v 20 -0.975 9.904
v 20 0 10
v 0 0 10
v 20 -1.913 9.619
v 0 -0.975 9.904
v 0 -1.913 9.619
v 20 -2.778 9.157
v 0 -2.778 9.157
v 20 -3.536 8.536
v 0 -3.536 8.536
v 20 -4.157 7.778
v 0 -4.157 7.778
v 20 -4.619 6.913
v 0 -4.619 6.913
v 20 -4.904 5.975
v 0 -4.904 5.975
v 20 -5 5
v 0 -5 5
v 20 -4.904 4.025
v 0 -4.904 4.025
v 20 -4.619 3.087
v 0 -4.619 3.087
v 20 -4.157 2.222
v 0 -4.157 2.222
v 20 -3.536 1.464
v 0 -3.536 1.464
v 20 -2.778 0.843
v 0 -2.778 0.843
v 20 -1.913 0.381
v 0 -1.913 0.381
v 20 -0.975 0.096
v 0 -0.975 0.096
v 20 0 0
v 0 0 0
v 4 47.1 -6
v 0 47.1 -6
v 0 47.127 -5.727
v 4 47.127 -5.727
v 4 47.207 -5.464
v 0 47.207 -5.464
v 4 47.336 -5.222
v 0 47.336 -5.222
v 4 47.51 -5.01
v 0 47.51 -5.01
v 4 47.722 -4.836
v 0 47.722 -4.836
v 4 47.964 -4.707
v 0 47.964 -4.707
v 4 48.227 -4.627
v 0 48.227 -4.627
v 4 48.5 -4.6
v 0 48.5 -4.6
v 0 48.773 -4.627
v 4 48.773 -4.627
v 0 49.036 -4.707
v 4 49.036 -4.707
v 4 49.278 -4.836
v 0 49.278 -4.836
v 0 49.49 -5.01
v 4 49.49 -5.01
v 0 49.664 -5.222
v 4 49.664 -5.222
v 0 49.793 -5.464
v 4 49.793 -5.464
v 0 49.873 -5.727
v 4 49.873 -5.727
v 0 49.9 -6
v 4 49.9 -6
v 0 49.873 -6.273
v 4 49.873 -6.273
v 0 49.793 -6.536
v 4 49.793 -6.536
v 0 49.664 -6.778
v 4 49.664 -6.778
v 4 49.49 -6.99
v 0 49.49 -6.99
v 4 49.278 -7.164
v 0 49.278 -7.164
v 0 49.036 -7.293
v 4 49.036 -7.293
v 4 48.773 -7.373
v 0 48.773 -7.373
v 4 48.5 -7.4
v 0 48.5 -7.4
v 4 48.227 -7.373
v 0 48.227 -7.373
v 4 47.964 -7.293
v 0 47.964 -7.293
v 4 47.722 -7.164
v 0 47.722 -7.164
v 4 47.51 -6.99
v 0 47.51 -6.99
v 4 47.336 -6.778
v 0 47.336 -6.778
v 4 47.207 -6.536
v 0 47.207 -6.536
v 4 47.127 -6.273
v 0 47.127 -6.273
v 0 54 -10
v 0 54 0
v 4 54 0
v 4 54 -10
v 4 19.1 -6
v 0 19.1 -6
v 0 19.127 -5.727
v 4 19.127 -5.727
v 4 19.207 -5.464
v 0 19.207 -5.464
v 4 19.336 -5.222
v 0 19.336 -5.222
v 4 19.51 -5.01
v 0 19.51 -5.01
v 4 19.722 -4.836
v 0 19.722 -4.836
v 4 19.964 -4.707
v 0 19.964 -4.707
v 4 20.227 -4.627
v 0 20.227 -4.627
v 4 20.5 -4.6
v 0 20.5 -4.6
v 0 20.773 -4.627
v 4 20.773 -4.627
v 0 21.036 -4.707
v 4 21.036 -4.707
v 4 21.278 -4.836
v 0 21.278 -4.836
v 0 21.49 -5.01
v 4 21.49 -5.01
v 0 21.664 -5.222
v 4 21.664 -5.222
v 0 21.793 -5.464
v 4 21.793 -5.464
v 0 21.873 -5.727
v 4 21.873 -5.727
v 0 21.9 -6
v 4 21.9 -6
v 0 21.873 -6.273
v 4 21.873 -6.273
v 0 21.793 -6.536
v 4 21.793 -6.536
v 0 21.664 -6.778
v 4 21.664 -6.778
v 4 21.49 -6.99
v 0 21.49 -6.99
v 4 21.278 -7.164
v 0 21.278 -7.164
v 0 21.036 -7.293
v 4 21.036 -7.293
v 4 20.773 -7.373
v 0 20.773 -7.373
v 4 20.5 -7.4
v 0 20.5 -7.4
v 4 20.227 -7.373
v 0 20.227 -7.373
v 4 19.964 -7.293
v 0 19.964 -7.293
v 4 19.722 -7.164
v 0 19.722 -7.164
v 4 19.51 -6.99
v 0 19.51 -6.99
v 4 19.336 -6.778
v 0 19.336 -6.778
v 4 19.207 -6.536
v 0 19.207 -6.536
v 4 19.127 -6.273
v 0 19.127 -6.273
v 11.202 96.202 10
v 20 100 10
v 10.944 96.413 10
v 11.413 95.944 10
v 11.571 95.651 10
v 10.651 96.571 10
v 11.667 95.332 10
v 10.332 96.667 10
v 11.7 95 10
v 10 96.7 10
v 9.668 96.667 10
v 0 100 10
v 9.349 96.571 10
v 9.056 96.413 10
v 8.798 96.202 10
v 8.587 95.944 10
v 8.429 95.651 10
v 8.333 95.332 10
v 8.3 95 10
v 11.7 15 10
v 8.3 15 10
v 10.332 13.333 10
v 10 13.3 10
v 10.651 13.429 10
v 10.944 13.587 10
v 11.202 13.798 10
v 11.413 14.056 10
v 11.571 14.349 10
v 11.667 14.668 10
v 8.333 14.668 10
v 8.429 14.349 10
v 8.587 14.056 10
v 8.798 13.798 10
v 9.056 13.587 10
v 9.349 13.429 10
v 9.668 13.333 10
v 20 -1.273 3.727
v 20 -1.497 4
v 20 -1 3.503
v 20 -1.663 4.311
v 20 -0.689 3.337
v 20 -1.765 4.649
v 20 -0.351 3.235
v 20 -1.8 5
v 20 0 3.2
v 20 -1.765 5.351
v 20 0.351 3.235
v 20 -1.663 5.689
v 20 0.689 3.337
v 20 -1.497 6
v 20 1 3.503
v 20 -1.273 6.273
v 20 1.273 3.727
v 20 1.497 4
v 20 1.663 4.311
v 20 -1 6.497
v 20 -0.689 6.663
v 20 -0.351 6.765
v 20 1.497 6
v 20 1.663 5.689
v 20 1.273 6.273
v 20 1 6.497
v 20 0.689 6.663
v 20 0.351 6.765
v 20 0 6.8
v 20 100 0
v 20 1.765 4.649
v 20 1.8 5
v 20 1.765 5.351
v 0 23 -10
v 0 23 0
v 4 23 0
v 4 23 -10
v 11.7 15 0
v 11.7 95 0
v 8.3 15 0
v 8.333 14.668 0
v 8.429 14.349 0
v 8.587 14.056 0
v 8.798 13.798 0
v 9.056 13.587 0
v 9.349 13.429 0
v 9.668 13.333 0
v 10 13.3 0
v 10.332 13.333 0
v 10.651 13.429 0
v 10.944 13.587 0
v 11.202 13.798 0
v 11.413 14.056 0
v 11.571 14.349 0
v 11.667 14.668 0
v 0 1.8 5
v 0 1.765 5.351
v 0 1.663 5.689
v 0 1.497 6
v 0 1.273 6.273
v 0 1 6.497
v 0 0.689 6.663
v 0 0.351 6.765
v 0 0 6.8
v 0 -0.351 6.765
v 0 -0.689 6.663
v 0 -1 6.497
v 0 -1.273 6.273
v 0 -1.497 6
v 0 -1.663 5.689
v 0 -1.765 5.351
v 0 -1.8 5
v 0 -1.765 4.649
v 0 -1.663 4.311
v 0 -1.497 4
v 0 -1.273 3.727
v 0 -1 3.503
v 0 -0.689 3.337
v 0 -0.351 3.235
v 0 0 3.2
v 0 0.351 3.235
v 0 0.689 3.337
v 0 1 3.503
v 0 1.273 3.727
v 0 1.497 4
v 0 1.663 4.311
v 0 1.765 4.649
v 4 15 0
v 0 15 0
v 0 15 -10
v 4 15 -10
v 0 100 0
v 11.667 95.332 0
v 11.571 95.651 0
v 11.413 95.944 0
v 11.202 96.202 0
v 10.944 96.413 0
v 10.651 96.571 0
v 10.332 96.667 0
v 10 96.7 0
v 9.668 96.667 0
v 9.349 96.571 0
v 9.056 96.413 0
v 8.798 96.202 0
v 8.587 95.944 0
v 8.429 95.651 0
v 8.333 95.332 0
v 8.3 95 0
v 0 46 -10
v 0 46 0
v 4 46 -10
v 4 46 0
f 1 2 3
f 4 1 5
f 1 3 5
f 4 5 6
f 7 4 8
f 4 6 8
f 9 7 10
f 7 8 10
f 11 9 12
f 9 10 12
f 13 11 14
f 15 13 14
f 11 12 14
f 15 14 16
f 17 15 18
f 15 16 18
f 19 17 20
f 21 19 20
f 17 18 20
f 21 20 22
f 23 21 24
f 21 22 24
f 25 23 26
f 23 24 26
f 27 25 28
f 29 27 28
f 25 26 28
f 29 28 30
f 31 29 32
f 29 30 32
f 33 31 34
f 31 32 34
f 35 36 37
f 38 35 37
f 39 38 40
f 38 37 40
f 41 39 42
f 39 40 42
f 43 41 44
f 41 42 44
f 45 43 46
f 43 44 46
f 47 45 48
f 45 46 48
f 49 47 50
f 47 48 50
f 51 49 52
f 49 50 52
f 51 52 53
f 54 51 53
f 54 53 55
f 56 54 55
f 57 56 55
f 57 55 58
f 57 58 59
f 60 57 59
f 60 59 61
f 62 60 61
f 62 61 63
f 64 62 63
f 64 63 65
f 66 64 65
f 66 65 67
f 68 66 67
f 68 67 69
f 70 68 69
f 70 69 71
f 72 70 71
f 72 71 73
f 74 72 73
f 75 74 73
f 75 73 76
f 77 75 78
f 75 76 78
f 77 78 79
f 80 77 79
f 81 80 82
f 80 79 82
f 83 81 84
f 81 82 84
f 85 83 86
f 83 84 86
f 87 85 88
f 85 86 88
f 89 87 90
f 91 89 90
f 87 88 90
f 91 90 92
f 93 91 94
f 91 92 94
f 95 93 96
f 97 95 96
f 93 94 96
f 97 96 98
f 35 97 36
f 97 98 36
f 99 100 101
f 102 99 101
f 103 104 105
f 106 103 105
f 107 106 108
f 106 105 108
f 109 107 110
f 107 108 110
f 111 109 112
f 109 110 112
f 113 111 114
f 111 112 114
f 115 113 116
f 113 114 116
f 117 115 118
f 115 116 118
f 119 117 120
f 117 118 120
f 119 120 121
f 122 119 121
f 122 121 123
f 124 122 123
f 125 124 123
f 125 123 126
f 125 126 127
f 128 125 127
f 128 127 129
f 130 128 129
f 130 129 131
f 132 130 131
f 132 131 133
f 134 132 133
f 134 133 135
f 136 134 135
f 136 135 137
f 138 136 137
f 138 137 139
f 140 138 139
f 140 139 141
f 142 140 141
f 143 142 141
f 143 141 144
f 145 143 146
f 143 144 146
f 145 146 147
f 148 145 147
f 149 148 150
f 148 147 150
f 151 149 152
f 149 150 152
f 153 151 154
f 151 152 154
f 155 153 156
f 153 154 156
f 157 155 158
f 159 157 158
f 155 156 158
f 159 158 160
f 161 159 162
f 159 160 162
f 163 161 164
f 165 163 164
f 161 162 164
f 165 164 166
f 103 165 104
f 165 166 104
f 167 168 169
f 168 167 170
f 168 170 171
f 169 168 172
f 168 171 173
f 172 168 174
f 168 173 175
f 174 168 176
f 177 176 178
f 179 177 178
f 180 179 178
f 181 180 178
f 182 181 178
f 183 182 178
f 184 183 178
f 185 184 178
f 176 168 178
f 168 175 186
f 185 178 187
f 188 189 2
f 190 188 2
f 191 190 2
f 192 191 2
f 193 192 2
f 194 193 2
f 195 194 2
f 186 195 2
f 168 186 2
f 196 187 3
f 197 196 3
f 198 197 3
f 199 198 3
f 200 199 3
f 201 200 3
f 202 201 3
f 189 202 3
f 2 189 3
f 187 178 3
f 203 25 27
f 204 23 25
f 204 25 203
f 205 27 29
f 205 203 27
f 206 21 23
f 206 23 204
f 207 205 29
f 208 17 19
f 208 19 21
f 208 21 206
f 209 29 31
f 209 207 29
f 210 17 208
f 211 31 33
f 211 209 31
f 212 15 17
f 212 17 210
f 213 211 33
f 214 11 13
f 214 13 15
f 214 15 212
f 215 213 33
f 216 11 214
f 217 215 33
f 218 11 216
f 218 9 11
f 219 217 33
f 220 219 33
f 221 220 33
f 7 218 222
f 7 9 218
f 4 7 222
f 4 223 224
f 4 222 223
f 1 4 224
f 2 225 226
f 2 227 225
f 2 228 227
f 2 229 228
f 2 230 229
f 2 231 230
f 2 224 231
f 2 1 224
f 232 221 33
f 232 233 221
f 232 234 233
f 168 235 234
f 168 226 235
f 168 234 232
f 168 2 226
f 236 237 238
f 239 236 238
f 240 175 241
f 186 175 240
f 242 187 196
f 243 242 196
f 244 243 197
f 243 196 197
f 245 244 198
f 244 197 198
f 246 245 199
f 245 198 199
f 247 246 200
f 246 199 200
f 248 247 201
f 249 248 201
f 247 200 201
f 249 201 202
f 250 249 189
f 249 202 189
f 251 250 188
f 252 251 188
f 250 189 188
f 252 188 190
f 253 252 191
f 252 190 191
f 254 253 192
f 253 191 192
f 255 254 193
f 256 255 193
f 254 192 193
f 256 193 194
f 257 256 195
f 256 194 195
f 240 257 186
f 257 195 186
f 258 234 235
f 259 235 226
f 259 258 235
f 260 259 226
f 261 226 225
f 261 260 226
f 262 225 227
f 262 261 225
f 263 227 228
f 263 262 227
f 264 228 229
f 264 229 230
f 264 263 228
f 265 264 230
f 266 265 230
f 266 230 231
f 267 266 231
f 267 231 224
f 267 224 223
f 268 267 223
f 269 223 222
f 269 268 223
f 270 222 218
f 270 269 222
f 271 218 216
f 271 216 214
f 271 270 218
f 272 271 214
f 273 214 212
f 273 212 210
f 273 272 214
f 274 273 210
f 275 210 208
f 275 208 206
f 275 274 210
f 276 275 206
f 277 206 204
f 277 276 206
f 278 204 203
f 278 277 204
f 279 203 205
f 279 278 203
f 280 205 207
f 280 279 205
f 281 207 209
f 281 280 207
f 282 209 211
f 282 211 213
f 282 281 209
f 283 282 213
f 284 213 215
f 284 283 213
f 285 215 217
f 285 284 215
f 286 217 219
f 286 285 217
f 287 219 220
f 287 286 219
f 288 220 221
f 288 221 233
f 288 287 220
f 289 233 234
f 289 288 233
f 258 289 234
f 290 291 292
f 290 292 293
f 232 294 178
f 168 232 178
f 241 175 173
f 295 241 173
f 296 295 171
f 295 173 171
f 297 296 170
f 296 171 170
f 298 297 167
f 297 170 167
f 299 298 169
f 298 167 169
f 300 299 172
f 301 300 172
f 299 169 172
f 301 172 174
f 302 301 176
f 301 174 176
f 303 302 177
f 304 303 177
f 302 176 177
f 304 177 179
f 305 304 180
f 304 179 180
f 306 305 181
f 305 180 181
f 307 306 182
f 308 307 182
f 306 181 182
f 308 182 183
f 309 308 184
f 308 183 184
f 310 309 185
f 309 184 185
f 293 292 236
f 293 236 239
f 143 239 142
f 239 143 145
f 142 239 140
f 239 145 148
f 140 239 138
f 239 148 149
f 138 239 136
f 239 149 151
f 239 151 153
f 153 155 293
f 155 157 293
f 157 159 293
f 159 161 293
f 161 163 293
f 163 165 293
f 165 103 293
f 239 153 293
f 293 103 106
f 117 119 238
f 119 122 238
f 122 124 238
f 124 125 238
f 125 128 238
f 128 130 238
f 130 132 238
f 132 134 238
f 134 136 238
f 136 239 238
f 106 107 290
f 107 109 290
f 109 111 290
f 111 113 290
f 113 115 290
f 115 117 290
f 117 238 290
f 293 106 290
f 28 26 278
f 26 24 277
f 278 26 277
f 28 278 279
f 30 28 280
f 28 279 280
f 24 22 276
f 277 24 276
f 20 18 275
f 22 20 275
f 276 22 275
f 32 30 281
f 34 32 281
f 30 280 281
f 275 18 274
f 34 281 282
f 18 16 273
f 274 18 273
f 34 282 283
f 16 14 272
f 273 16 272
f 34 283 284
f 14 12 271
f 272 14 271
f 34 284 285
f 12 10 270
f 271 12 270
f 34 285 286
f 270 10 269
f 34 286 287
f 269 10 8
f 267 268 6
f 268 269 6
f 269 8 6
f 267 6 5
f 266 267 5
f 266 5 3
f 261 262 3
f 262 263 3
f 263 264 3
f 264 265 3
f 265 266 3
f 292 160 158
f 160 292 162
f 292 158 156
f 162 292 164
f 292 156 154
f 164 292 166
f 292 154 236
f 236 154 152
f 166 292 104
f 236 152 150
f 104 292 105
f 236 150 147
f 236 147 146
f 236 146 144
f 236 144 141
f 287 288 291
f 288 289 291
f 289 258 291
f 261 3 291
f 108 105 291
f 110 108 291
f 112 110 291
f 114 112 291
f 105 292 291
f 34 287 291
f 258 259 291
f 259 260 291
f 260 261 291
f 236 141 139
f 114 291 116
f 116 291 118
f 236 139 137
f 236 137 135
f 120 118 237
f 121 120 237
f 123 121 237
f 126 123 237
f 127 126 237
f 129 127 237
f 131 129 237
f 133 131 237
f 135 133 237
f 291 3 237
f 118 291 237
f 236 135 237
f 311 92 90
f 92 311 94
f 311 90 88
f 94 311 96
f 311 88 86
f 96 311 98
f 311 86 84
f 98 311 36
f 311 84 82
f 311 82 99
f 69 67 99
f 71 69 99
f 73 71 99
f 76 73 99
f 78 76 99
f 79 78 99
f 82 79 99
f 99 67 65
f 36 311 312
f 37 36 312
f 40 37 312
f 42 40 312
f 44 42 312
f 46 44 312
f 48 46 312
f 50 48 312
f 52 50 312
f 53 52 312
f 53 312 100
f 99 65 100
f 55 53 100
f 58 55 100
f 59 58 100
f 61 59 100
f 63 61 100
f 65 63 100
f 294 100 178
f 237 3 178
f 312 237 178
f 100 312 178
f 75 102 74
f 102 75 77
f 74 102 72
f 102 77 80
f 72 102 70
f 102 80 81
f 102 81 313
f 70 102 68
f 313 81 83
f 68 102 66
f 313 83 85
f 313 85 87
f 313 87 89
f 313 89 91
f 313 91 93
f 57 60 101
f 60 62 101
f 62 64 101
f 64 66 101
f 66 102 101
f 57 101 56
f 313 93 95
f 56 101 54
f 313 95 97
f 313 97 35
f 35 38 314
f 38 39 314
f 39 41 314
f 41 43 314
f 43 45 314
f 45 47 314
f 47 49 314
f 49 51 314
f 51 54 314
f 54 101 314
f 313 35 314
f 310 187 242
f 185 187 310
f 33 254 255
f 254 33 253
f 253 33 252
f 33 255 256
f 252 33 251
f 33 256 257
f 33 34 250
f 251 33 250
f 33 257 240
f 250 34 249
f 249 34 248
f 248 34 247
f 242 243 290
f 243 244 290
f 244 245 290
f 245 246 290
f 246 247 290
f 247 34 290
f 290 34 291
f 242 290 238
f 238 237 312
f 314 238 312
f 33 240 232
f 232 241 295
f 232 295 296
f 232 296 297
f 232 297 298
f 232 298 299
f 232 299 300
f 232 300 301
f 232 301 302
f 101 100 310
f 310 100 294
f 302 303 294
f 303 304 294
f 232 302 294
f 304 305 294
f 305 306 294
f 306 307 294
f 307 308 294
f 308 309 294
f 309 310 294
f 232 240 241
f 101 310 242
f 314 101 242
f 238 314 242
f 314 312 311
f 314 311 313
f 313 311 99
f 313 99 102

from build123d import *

# Parameters (mm, degrees)
SKETCH_R        = 1.8
PAD_DEPTH       = 20
POCKET_DEPTH    = 10
SKETCH002_W     = 4
SKETCH002_H     = 8
PAD001_DEPTH    = 10
SKETCH003_R     = 1.4
POCKET001_DEPTH = 5


with BuildPart() as part:
    # Sketch → Pad (new body)
    with BuildSketch(Plane.YZ):
        with BuildLine():
            ThreePointArc((0, 10), (-5, 5), (0, 0))
            Line((0, 0), (100, 0))
            Line((100, 0), (100, 10))
            Line((100, 10), (0, 10))
        make_face()
        with Locations((0, 5)):
            Circle(SKETCH_R, mode=Mode.SUBTRACT)
    extrude(amount=PAD_DEPTH)

    # Sketch001 → Pocket (cut)
    with BuildSketch(Plane.XY.offset(10)):
        with BuildLine():
            ThreePointArc((11.7, 95), (10, 96.7), (8.3, 95))
            Line((8.3, 15), (8.3, 95))
            ThreePointArc((8.3, 15), (10, 13.3), (11.7, 15))
            Line((11.7, 95), (11.7, 15))
        make_face()
    extrude(amount=-POCKET_DEPTH, mode=Mode.SUBTRACT)

    # Sketch002 → Pad001 (new body)
    with BuildSketch(Plane(origin=(0, 0, 0), x_dir=(1, 0, 0), z_dir=(0, 0, -1))):
        with Locations((2, -19)):
            Rectangle(SKETCH002_W, SKETCH002_H)
        with Locations((2, -50)):
            Rectangle(SKETCH002_W, SKETCH002_H)
    extrude(amount=PAD001_DEPTH)

    # Sketch003 → Pocket001 (cut)
    with BuildSketch(Plane(origin=(0, 0, 0), x_dir=(0, -1, 0), z_dir=(-1, 0, 0))):
        with Locations((-48.5, -6)):
            Circle(SKETCH003_R)
        with Locations((-20.5, -6)):
            Circle(SKETCH003_R)
    extrude(amount=-POCKET001_DEPTH, mode=Mode.SUBTRACT)


solid = part.part
